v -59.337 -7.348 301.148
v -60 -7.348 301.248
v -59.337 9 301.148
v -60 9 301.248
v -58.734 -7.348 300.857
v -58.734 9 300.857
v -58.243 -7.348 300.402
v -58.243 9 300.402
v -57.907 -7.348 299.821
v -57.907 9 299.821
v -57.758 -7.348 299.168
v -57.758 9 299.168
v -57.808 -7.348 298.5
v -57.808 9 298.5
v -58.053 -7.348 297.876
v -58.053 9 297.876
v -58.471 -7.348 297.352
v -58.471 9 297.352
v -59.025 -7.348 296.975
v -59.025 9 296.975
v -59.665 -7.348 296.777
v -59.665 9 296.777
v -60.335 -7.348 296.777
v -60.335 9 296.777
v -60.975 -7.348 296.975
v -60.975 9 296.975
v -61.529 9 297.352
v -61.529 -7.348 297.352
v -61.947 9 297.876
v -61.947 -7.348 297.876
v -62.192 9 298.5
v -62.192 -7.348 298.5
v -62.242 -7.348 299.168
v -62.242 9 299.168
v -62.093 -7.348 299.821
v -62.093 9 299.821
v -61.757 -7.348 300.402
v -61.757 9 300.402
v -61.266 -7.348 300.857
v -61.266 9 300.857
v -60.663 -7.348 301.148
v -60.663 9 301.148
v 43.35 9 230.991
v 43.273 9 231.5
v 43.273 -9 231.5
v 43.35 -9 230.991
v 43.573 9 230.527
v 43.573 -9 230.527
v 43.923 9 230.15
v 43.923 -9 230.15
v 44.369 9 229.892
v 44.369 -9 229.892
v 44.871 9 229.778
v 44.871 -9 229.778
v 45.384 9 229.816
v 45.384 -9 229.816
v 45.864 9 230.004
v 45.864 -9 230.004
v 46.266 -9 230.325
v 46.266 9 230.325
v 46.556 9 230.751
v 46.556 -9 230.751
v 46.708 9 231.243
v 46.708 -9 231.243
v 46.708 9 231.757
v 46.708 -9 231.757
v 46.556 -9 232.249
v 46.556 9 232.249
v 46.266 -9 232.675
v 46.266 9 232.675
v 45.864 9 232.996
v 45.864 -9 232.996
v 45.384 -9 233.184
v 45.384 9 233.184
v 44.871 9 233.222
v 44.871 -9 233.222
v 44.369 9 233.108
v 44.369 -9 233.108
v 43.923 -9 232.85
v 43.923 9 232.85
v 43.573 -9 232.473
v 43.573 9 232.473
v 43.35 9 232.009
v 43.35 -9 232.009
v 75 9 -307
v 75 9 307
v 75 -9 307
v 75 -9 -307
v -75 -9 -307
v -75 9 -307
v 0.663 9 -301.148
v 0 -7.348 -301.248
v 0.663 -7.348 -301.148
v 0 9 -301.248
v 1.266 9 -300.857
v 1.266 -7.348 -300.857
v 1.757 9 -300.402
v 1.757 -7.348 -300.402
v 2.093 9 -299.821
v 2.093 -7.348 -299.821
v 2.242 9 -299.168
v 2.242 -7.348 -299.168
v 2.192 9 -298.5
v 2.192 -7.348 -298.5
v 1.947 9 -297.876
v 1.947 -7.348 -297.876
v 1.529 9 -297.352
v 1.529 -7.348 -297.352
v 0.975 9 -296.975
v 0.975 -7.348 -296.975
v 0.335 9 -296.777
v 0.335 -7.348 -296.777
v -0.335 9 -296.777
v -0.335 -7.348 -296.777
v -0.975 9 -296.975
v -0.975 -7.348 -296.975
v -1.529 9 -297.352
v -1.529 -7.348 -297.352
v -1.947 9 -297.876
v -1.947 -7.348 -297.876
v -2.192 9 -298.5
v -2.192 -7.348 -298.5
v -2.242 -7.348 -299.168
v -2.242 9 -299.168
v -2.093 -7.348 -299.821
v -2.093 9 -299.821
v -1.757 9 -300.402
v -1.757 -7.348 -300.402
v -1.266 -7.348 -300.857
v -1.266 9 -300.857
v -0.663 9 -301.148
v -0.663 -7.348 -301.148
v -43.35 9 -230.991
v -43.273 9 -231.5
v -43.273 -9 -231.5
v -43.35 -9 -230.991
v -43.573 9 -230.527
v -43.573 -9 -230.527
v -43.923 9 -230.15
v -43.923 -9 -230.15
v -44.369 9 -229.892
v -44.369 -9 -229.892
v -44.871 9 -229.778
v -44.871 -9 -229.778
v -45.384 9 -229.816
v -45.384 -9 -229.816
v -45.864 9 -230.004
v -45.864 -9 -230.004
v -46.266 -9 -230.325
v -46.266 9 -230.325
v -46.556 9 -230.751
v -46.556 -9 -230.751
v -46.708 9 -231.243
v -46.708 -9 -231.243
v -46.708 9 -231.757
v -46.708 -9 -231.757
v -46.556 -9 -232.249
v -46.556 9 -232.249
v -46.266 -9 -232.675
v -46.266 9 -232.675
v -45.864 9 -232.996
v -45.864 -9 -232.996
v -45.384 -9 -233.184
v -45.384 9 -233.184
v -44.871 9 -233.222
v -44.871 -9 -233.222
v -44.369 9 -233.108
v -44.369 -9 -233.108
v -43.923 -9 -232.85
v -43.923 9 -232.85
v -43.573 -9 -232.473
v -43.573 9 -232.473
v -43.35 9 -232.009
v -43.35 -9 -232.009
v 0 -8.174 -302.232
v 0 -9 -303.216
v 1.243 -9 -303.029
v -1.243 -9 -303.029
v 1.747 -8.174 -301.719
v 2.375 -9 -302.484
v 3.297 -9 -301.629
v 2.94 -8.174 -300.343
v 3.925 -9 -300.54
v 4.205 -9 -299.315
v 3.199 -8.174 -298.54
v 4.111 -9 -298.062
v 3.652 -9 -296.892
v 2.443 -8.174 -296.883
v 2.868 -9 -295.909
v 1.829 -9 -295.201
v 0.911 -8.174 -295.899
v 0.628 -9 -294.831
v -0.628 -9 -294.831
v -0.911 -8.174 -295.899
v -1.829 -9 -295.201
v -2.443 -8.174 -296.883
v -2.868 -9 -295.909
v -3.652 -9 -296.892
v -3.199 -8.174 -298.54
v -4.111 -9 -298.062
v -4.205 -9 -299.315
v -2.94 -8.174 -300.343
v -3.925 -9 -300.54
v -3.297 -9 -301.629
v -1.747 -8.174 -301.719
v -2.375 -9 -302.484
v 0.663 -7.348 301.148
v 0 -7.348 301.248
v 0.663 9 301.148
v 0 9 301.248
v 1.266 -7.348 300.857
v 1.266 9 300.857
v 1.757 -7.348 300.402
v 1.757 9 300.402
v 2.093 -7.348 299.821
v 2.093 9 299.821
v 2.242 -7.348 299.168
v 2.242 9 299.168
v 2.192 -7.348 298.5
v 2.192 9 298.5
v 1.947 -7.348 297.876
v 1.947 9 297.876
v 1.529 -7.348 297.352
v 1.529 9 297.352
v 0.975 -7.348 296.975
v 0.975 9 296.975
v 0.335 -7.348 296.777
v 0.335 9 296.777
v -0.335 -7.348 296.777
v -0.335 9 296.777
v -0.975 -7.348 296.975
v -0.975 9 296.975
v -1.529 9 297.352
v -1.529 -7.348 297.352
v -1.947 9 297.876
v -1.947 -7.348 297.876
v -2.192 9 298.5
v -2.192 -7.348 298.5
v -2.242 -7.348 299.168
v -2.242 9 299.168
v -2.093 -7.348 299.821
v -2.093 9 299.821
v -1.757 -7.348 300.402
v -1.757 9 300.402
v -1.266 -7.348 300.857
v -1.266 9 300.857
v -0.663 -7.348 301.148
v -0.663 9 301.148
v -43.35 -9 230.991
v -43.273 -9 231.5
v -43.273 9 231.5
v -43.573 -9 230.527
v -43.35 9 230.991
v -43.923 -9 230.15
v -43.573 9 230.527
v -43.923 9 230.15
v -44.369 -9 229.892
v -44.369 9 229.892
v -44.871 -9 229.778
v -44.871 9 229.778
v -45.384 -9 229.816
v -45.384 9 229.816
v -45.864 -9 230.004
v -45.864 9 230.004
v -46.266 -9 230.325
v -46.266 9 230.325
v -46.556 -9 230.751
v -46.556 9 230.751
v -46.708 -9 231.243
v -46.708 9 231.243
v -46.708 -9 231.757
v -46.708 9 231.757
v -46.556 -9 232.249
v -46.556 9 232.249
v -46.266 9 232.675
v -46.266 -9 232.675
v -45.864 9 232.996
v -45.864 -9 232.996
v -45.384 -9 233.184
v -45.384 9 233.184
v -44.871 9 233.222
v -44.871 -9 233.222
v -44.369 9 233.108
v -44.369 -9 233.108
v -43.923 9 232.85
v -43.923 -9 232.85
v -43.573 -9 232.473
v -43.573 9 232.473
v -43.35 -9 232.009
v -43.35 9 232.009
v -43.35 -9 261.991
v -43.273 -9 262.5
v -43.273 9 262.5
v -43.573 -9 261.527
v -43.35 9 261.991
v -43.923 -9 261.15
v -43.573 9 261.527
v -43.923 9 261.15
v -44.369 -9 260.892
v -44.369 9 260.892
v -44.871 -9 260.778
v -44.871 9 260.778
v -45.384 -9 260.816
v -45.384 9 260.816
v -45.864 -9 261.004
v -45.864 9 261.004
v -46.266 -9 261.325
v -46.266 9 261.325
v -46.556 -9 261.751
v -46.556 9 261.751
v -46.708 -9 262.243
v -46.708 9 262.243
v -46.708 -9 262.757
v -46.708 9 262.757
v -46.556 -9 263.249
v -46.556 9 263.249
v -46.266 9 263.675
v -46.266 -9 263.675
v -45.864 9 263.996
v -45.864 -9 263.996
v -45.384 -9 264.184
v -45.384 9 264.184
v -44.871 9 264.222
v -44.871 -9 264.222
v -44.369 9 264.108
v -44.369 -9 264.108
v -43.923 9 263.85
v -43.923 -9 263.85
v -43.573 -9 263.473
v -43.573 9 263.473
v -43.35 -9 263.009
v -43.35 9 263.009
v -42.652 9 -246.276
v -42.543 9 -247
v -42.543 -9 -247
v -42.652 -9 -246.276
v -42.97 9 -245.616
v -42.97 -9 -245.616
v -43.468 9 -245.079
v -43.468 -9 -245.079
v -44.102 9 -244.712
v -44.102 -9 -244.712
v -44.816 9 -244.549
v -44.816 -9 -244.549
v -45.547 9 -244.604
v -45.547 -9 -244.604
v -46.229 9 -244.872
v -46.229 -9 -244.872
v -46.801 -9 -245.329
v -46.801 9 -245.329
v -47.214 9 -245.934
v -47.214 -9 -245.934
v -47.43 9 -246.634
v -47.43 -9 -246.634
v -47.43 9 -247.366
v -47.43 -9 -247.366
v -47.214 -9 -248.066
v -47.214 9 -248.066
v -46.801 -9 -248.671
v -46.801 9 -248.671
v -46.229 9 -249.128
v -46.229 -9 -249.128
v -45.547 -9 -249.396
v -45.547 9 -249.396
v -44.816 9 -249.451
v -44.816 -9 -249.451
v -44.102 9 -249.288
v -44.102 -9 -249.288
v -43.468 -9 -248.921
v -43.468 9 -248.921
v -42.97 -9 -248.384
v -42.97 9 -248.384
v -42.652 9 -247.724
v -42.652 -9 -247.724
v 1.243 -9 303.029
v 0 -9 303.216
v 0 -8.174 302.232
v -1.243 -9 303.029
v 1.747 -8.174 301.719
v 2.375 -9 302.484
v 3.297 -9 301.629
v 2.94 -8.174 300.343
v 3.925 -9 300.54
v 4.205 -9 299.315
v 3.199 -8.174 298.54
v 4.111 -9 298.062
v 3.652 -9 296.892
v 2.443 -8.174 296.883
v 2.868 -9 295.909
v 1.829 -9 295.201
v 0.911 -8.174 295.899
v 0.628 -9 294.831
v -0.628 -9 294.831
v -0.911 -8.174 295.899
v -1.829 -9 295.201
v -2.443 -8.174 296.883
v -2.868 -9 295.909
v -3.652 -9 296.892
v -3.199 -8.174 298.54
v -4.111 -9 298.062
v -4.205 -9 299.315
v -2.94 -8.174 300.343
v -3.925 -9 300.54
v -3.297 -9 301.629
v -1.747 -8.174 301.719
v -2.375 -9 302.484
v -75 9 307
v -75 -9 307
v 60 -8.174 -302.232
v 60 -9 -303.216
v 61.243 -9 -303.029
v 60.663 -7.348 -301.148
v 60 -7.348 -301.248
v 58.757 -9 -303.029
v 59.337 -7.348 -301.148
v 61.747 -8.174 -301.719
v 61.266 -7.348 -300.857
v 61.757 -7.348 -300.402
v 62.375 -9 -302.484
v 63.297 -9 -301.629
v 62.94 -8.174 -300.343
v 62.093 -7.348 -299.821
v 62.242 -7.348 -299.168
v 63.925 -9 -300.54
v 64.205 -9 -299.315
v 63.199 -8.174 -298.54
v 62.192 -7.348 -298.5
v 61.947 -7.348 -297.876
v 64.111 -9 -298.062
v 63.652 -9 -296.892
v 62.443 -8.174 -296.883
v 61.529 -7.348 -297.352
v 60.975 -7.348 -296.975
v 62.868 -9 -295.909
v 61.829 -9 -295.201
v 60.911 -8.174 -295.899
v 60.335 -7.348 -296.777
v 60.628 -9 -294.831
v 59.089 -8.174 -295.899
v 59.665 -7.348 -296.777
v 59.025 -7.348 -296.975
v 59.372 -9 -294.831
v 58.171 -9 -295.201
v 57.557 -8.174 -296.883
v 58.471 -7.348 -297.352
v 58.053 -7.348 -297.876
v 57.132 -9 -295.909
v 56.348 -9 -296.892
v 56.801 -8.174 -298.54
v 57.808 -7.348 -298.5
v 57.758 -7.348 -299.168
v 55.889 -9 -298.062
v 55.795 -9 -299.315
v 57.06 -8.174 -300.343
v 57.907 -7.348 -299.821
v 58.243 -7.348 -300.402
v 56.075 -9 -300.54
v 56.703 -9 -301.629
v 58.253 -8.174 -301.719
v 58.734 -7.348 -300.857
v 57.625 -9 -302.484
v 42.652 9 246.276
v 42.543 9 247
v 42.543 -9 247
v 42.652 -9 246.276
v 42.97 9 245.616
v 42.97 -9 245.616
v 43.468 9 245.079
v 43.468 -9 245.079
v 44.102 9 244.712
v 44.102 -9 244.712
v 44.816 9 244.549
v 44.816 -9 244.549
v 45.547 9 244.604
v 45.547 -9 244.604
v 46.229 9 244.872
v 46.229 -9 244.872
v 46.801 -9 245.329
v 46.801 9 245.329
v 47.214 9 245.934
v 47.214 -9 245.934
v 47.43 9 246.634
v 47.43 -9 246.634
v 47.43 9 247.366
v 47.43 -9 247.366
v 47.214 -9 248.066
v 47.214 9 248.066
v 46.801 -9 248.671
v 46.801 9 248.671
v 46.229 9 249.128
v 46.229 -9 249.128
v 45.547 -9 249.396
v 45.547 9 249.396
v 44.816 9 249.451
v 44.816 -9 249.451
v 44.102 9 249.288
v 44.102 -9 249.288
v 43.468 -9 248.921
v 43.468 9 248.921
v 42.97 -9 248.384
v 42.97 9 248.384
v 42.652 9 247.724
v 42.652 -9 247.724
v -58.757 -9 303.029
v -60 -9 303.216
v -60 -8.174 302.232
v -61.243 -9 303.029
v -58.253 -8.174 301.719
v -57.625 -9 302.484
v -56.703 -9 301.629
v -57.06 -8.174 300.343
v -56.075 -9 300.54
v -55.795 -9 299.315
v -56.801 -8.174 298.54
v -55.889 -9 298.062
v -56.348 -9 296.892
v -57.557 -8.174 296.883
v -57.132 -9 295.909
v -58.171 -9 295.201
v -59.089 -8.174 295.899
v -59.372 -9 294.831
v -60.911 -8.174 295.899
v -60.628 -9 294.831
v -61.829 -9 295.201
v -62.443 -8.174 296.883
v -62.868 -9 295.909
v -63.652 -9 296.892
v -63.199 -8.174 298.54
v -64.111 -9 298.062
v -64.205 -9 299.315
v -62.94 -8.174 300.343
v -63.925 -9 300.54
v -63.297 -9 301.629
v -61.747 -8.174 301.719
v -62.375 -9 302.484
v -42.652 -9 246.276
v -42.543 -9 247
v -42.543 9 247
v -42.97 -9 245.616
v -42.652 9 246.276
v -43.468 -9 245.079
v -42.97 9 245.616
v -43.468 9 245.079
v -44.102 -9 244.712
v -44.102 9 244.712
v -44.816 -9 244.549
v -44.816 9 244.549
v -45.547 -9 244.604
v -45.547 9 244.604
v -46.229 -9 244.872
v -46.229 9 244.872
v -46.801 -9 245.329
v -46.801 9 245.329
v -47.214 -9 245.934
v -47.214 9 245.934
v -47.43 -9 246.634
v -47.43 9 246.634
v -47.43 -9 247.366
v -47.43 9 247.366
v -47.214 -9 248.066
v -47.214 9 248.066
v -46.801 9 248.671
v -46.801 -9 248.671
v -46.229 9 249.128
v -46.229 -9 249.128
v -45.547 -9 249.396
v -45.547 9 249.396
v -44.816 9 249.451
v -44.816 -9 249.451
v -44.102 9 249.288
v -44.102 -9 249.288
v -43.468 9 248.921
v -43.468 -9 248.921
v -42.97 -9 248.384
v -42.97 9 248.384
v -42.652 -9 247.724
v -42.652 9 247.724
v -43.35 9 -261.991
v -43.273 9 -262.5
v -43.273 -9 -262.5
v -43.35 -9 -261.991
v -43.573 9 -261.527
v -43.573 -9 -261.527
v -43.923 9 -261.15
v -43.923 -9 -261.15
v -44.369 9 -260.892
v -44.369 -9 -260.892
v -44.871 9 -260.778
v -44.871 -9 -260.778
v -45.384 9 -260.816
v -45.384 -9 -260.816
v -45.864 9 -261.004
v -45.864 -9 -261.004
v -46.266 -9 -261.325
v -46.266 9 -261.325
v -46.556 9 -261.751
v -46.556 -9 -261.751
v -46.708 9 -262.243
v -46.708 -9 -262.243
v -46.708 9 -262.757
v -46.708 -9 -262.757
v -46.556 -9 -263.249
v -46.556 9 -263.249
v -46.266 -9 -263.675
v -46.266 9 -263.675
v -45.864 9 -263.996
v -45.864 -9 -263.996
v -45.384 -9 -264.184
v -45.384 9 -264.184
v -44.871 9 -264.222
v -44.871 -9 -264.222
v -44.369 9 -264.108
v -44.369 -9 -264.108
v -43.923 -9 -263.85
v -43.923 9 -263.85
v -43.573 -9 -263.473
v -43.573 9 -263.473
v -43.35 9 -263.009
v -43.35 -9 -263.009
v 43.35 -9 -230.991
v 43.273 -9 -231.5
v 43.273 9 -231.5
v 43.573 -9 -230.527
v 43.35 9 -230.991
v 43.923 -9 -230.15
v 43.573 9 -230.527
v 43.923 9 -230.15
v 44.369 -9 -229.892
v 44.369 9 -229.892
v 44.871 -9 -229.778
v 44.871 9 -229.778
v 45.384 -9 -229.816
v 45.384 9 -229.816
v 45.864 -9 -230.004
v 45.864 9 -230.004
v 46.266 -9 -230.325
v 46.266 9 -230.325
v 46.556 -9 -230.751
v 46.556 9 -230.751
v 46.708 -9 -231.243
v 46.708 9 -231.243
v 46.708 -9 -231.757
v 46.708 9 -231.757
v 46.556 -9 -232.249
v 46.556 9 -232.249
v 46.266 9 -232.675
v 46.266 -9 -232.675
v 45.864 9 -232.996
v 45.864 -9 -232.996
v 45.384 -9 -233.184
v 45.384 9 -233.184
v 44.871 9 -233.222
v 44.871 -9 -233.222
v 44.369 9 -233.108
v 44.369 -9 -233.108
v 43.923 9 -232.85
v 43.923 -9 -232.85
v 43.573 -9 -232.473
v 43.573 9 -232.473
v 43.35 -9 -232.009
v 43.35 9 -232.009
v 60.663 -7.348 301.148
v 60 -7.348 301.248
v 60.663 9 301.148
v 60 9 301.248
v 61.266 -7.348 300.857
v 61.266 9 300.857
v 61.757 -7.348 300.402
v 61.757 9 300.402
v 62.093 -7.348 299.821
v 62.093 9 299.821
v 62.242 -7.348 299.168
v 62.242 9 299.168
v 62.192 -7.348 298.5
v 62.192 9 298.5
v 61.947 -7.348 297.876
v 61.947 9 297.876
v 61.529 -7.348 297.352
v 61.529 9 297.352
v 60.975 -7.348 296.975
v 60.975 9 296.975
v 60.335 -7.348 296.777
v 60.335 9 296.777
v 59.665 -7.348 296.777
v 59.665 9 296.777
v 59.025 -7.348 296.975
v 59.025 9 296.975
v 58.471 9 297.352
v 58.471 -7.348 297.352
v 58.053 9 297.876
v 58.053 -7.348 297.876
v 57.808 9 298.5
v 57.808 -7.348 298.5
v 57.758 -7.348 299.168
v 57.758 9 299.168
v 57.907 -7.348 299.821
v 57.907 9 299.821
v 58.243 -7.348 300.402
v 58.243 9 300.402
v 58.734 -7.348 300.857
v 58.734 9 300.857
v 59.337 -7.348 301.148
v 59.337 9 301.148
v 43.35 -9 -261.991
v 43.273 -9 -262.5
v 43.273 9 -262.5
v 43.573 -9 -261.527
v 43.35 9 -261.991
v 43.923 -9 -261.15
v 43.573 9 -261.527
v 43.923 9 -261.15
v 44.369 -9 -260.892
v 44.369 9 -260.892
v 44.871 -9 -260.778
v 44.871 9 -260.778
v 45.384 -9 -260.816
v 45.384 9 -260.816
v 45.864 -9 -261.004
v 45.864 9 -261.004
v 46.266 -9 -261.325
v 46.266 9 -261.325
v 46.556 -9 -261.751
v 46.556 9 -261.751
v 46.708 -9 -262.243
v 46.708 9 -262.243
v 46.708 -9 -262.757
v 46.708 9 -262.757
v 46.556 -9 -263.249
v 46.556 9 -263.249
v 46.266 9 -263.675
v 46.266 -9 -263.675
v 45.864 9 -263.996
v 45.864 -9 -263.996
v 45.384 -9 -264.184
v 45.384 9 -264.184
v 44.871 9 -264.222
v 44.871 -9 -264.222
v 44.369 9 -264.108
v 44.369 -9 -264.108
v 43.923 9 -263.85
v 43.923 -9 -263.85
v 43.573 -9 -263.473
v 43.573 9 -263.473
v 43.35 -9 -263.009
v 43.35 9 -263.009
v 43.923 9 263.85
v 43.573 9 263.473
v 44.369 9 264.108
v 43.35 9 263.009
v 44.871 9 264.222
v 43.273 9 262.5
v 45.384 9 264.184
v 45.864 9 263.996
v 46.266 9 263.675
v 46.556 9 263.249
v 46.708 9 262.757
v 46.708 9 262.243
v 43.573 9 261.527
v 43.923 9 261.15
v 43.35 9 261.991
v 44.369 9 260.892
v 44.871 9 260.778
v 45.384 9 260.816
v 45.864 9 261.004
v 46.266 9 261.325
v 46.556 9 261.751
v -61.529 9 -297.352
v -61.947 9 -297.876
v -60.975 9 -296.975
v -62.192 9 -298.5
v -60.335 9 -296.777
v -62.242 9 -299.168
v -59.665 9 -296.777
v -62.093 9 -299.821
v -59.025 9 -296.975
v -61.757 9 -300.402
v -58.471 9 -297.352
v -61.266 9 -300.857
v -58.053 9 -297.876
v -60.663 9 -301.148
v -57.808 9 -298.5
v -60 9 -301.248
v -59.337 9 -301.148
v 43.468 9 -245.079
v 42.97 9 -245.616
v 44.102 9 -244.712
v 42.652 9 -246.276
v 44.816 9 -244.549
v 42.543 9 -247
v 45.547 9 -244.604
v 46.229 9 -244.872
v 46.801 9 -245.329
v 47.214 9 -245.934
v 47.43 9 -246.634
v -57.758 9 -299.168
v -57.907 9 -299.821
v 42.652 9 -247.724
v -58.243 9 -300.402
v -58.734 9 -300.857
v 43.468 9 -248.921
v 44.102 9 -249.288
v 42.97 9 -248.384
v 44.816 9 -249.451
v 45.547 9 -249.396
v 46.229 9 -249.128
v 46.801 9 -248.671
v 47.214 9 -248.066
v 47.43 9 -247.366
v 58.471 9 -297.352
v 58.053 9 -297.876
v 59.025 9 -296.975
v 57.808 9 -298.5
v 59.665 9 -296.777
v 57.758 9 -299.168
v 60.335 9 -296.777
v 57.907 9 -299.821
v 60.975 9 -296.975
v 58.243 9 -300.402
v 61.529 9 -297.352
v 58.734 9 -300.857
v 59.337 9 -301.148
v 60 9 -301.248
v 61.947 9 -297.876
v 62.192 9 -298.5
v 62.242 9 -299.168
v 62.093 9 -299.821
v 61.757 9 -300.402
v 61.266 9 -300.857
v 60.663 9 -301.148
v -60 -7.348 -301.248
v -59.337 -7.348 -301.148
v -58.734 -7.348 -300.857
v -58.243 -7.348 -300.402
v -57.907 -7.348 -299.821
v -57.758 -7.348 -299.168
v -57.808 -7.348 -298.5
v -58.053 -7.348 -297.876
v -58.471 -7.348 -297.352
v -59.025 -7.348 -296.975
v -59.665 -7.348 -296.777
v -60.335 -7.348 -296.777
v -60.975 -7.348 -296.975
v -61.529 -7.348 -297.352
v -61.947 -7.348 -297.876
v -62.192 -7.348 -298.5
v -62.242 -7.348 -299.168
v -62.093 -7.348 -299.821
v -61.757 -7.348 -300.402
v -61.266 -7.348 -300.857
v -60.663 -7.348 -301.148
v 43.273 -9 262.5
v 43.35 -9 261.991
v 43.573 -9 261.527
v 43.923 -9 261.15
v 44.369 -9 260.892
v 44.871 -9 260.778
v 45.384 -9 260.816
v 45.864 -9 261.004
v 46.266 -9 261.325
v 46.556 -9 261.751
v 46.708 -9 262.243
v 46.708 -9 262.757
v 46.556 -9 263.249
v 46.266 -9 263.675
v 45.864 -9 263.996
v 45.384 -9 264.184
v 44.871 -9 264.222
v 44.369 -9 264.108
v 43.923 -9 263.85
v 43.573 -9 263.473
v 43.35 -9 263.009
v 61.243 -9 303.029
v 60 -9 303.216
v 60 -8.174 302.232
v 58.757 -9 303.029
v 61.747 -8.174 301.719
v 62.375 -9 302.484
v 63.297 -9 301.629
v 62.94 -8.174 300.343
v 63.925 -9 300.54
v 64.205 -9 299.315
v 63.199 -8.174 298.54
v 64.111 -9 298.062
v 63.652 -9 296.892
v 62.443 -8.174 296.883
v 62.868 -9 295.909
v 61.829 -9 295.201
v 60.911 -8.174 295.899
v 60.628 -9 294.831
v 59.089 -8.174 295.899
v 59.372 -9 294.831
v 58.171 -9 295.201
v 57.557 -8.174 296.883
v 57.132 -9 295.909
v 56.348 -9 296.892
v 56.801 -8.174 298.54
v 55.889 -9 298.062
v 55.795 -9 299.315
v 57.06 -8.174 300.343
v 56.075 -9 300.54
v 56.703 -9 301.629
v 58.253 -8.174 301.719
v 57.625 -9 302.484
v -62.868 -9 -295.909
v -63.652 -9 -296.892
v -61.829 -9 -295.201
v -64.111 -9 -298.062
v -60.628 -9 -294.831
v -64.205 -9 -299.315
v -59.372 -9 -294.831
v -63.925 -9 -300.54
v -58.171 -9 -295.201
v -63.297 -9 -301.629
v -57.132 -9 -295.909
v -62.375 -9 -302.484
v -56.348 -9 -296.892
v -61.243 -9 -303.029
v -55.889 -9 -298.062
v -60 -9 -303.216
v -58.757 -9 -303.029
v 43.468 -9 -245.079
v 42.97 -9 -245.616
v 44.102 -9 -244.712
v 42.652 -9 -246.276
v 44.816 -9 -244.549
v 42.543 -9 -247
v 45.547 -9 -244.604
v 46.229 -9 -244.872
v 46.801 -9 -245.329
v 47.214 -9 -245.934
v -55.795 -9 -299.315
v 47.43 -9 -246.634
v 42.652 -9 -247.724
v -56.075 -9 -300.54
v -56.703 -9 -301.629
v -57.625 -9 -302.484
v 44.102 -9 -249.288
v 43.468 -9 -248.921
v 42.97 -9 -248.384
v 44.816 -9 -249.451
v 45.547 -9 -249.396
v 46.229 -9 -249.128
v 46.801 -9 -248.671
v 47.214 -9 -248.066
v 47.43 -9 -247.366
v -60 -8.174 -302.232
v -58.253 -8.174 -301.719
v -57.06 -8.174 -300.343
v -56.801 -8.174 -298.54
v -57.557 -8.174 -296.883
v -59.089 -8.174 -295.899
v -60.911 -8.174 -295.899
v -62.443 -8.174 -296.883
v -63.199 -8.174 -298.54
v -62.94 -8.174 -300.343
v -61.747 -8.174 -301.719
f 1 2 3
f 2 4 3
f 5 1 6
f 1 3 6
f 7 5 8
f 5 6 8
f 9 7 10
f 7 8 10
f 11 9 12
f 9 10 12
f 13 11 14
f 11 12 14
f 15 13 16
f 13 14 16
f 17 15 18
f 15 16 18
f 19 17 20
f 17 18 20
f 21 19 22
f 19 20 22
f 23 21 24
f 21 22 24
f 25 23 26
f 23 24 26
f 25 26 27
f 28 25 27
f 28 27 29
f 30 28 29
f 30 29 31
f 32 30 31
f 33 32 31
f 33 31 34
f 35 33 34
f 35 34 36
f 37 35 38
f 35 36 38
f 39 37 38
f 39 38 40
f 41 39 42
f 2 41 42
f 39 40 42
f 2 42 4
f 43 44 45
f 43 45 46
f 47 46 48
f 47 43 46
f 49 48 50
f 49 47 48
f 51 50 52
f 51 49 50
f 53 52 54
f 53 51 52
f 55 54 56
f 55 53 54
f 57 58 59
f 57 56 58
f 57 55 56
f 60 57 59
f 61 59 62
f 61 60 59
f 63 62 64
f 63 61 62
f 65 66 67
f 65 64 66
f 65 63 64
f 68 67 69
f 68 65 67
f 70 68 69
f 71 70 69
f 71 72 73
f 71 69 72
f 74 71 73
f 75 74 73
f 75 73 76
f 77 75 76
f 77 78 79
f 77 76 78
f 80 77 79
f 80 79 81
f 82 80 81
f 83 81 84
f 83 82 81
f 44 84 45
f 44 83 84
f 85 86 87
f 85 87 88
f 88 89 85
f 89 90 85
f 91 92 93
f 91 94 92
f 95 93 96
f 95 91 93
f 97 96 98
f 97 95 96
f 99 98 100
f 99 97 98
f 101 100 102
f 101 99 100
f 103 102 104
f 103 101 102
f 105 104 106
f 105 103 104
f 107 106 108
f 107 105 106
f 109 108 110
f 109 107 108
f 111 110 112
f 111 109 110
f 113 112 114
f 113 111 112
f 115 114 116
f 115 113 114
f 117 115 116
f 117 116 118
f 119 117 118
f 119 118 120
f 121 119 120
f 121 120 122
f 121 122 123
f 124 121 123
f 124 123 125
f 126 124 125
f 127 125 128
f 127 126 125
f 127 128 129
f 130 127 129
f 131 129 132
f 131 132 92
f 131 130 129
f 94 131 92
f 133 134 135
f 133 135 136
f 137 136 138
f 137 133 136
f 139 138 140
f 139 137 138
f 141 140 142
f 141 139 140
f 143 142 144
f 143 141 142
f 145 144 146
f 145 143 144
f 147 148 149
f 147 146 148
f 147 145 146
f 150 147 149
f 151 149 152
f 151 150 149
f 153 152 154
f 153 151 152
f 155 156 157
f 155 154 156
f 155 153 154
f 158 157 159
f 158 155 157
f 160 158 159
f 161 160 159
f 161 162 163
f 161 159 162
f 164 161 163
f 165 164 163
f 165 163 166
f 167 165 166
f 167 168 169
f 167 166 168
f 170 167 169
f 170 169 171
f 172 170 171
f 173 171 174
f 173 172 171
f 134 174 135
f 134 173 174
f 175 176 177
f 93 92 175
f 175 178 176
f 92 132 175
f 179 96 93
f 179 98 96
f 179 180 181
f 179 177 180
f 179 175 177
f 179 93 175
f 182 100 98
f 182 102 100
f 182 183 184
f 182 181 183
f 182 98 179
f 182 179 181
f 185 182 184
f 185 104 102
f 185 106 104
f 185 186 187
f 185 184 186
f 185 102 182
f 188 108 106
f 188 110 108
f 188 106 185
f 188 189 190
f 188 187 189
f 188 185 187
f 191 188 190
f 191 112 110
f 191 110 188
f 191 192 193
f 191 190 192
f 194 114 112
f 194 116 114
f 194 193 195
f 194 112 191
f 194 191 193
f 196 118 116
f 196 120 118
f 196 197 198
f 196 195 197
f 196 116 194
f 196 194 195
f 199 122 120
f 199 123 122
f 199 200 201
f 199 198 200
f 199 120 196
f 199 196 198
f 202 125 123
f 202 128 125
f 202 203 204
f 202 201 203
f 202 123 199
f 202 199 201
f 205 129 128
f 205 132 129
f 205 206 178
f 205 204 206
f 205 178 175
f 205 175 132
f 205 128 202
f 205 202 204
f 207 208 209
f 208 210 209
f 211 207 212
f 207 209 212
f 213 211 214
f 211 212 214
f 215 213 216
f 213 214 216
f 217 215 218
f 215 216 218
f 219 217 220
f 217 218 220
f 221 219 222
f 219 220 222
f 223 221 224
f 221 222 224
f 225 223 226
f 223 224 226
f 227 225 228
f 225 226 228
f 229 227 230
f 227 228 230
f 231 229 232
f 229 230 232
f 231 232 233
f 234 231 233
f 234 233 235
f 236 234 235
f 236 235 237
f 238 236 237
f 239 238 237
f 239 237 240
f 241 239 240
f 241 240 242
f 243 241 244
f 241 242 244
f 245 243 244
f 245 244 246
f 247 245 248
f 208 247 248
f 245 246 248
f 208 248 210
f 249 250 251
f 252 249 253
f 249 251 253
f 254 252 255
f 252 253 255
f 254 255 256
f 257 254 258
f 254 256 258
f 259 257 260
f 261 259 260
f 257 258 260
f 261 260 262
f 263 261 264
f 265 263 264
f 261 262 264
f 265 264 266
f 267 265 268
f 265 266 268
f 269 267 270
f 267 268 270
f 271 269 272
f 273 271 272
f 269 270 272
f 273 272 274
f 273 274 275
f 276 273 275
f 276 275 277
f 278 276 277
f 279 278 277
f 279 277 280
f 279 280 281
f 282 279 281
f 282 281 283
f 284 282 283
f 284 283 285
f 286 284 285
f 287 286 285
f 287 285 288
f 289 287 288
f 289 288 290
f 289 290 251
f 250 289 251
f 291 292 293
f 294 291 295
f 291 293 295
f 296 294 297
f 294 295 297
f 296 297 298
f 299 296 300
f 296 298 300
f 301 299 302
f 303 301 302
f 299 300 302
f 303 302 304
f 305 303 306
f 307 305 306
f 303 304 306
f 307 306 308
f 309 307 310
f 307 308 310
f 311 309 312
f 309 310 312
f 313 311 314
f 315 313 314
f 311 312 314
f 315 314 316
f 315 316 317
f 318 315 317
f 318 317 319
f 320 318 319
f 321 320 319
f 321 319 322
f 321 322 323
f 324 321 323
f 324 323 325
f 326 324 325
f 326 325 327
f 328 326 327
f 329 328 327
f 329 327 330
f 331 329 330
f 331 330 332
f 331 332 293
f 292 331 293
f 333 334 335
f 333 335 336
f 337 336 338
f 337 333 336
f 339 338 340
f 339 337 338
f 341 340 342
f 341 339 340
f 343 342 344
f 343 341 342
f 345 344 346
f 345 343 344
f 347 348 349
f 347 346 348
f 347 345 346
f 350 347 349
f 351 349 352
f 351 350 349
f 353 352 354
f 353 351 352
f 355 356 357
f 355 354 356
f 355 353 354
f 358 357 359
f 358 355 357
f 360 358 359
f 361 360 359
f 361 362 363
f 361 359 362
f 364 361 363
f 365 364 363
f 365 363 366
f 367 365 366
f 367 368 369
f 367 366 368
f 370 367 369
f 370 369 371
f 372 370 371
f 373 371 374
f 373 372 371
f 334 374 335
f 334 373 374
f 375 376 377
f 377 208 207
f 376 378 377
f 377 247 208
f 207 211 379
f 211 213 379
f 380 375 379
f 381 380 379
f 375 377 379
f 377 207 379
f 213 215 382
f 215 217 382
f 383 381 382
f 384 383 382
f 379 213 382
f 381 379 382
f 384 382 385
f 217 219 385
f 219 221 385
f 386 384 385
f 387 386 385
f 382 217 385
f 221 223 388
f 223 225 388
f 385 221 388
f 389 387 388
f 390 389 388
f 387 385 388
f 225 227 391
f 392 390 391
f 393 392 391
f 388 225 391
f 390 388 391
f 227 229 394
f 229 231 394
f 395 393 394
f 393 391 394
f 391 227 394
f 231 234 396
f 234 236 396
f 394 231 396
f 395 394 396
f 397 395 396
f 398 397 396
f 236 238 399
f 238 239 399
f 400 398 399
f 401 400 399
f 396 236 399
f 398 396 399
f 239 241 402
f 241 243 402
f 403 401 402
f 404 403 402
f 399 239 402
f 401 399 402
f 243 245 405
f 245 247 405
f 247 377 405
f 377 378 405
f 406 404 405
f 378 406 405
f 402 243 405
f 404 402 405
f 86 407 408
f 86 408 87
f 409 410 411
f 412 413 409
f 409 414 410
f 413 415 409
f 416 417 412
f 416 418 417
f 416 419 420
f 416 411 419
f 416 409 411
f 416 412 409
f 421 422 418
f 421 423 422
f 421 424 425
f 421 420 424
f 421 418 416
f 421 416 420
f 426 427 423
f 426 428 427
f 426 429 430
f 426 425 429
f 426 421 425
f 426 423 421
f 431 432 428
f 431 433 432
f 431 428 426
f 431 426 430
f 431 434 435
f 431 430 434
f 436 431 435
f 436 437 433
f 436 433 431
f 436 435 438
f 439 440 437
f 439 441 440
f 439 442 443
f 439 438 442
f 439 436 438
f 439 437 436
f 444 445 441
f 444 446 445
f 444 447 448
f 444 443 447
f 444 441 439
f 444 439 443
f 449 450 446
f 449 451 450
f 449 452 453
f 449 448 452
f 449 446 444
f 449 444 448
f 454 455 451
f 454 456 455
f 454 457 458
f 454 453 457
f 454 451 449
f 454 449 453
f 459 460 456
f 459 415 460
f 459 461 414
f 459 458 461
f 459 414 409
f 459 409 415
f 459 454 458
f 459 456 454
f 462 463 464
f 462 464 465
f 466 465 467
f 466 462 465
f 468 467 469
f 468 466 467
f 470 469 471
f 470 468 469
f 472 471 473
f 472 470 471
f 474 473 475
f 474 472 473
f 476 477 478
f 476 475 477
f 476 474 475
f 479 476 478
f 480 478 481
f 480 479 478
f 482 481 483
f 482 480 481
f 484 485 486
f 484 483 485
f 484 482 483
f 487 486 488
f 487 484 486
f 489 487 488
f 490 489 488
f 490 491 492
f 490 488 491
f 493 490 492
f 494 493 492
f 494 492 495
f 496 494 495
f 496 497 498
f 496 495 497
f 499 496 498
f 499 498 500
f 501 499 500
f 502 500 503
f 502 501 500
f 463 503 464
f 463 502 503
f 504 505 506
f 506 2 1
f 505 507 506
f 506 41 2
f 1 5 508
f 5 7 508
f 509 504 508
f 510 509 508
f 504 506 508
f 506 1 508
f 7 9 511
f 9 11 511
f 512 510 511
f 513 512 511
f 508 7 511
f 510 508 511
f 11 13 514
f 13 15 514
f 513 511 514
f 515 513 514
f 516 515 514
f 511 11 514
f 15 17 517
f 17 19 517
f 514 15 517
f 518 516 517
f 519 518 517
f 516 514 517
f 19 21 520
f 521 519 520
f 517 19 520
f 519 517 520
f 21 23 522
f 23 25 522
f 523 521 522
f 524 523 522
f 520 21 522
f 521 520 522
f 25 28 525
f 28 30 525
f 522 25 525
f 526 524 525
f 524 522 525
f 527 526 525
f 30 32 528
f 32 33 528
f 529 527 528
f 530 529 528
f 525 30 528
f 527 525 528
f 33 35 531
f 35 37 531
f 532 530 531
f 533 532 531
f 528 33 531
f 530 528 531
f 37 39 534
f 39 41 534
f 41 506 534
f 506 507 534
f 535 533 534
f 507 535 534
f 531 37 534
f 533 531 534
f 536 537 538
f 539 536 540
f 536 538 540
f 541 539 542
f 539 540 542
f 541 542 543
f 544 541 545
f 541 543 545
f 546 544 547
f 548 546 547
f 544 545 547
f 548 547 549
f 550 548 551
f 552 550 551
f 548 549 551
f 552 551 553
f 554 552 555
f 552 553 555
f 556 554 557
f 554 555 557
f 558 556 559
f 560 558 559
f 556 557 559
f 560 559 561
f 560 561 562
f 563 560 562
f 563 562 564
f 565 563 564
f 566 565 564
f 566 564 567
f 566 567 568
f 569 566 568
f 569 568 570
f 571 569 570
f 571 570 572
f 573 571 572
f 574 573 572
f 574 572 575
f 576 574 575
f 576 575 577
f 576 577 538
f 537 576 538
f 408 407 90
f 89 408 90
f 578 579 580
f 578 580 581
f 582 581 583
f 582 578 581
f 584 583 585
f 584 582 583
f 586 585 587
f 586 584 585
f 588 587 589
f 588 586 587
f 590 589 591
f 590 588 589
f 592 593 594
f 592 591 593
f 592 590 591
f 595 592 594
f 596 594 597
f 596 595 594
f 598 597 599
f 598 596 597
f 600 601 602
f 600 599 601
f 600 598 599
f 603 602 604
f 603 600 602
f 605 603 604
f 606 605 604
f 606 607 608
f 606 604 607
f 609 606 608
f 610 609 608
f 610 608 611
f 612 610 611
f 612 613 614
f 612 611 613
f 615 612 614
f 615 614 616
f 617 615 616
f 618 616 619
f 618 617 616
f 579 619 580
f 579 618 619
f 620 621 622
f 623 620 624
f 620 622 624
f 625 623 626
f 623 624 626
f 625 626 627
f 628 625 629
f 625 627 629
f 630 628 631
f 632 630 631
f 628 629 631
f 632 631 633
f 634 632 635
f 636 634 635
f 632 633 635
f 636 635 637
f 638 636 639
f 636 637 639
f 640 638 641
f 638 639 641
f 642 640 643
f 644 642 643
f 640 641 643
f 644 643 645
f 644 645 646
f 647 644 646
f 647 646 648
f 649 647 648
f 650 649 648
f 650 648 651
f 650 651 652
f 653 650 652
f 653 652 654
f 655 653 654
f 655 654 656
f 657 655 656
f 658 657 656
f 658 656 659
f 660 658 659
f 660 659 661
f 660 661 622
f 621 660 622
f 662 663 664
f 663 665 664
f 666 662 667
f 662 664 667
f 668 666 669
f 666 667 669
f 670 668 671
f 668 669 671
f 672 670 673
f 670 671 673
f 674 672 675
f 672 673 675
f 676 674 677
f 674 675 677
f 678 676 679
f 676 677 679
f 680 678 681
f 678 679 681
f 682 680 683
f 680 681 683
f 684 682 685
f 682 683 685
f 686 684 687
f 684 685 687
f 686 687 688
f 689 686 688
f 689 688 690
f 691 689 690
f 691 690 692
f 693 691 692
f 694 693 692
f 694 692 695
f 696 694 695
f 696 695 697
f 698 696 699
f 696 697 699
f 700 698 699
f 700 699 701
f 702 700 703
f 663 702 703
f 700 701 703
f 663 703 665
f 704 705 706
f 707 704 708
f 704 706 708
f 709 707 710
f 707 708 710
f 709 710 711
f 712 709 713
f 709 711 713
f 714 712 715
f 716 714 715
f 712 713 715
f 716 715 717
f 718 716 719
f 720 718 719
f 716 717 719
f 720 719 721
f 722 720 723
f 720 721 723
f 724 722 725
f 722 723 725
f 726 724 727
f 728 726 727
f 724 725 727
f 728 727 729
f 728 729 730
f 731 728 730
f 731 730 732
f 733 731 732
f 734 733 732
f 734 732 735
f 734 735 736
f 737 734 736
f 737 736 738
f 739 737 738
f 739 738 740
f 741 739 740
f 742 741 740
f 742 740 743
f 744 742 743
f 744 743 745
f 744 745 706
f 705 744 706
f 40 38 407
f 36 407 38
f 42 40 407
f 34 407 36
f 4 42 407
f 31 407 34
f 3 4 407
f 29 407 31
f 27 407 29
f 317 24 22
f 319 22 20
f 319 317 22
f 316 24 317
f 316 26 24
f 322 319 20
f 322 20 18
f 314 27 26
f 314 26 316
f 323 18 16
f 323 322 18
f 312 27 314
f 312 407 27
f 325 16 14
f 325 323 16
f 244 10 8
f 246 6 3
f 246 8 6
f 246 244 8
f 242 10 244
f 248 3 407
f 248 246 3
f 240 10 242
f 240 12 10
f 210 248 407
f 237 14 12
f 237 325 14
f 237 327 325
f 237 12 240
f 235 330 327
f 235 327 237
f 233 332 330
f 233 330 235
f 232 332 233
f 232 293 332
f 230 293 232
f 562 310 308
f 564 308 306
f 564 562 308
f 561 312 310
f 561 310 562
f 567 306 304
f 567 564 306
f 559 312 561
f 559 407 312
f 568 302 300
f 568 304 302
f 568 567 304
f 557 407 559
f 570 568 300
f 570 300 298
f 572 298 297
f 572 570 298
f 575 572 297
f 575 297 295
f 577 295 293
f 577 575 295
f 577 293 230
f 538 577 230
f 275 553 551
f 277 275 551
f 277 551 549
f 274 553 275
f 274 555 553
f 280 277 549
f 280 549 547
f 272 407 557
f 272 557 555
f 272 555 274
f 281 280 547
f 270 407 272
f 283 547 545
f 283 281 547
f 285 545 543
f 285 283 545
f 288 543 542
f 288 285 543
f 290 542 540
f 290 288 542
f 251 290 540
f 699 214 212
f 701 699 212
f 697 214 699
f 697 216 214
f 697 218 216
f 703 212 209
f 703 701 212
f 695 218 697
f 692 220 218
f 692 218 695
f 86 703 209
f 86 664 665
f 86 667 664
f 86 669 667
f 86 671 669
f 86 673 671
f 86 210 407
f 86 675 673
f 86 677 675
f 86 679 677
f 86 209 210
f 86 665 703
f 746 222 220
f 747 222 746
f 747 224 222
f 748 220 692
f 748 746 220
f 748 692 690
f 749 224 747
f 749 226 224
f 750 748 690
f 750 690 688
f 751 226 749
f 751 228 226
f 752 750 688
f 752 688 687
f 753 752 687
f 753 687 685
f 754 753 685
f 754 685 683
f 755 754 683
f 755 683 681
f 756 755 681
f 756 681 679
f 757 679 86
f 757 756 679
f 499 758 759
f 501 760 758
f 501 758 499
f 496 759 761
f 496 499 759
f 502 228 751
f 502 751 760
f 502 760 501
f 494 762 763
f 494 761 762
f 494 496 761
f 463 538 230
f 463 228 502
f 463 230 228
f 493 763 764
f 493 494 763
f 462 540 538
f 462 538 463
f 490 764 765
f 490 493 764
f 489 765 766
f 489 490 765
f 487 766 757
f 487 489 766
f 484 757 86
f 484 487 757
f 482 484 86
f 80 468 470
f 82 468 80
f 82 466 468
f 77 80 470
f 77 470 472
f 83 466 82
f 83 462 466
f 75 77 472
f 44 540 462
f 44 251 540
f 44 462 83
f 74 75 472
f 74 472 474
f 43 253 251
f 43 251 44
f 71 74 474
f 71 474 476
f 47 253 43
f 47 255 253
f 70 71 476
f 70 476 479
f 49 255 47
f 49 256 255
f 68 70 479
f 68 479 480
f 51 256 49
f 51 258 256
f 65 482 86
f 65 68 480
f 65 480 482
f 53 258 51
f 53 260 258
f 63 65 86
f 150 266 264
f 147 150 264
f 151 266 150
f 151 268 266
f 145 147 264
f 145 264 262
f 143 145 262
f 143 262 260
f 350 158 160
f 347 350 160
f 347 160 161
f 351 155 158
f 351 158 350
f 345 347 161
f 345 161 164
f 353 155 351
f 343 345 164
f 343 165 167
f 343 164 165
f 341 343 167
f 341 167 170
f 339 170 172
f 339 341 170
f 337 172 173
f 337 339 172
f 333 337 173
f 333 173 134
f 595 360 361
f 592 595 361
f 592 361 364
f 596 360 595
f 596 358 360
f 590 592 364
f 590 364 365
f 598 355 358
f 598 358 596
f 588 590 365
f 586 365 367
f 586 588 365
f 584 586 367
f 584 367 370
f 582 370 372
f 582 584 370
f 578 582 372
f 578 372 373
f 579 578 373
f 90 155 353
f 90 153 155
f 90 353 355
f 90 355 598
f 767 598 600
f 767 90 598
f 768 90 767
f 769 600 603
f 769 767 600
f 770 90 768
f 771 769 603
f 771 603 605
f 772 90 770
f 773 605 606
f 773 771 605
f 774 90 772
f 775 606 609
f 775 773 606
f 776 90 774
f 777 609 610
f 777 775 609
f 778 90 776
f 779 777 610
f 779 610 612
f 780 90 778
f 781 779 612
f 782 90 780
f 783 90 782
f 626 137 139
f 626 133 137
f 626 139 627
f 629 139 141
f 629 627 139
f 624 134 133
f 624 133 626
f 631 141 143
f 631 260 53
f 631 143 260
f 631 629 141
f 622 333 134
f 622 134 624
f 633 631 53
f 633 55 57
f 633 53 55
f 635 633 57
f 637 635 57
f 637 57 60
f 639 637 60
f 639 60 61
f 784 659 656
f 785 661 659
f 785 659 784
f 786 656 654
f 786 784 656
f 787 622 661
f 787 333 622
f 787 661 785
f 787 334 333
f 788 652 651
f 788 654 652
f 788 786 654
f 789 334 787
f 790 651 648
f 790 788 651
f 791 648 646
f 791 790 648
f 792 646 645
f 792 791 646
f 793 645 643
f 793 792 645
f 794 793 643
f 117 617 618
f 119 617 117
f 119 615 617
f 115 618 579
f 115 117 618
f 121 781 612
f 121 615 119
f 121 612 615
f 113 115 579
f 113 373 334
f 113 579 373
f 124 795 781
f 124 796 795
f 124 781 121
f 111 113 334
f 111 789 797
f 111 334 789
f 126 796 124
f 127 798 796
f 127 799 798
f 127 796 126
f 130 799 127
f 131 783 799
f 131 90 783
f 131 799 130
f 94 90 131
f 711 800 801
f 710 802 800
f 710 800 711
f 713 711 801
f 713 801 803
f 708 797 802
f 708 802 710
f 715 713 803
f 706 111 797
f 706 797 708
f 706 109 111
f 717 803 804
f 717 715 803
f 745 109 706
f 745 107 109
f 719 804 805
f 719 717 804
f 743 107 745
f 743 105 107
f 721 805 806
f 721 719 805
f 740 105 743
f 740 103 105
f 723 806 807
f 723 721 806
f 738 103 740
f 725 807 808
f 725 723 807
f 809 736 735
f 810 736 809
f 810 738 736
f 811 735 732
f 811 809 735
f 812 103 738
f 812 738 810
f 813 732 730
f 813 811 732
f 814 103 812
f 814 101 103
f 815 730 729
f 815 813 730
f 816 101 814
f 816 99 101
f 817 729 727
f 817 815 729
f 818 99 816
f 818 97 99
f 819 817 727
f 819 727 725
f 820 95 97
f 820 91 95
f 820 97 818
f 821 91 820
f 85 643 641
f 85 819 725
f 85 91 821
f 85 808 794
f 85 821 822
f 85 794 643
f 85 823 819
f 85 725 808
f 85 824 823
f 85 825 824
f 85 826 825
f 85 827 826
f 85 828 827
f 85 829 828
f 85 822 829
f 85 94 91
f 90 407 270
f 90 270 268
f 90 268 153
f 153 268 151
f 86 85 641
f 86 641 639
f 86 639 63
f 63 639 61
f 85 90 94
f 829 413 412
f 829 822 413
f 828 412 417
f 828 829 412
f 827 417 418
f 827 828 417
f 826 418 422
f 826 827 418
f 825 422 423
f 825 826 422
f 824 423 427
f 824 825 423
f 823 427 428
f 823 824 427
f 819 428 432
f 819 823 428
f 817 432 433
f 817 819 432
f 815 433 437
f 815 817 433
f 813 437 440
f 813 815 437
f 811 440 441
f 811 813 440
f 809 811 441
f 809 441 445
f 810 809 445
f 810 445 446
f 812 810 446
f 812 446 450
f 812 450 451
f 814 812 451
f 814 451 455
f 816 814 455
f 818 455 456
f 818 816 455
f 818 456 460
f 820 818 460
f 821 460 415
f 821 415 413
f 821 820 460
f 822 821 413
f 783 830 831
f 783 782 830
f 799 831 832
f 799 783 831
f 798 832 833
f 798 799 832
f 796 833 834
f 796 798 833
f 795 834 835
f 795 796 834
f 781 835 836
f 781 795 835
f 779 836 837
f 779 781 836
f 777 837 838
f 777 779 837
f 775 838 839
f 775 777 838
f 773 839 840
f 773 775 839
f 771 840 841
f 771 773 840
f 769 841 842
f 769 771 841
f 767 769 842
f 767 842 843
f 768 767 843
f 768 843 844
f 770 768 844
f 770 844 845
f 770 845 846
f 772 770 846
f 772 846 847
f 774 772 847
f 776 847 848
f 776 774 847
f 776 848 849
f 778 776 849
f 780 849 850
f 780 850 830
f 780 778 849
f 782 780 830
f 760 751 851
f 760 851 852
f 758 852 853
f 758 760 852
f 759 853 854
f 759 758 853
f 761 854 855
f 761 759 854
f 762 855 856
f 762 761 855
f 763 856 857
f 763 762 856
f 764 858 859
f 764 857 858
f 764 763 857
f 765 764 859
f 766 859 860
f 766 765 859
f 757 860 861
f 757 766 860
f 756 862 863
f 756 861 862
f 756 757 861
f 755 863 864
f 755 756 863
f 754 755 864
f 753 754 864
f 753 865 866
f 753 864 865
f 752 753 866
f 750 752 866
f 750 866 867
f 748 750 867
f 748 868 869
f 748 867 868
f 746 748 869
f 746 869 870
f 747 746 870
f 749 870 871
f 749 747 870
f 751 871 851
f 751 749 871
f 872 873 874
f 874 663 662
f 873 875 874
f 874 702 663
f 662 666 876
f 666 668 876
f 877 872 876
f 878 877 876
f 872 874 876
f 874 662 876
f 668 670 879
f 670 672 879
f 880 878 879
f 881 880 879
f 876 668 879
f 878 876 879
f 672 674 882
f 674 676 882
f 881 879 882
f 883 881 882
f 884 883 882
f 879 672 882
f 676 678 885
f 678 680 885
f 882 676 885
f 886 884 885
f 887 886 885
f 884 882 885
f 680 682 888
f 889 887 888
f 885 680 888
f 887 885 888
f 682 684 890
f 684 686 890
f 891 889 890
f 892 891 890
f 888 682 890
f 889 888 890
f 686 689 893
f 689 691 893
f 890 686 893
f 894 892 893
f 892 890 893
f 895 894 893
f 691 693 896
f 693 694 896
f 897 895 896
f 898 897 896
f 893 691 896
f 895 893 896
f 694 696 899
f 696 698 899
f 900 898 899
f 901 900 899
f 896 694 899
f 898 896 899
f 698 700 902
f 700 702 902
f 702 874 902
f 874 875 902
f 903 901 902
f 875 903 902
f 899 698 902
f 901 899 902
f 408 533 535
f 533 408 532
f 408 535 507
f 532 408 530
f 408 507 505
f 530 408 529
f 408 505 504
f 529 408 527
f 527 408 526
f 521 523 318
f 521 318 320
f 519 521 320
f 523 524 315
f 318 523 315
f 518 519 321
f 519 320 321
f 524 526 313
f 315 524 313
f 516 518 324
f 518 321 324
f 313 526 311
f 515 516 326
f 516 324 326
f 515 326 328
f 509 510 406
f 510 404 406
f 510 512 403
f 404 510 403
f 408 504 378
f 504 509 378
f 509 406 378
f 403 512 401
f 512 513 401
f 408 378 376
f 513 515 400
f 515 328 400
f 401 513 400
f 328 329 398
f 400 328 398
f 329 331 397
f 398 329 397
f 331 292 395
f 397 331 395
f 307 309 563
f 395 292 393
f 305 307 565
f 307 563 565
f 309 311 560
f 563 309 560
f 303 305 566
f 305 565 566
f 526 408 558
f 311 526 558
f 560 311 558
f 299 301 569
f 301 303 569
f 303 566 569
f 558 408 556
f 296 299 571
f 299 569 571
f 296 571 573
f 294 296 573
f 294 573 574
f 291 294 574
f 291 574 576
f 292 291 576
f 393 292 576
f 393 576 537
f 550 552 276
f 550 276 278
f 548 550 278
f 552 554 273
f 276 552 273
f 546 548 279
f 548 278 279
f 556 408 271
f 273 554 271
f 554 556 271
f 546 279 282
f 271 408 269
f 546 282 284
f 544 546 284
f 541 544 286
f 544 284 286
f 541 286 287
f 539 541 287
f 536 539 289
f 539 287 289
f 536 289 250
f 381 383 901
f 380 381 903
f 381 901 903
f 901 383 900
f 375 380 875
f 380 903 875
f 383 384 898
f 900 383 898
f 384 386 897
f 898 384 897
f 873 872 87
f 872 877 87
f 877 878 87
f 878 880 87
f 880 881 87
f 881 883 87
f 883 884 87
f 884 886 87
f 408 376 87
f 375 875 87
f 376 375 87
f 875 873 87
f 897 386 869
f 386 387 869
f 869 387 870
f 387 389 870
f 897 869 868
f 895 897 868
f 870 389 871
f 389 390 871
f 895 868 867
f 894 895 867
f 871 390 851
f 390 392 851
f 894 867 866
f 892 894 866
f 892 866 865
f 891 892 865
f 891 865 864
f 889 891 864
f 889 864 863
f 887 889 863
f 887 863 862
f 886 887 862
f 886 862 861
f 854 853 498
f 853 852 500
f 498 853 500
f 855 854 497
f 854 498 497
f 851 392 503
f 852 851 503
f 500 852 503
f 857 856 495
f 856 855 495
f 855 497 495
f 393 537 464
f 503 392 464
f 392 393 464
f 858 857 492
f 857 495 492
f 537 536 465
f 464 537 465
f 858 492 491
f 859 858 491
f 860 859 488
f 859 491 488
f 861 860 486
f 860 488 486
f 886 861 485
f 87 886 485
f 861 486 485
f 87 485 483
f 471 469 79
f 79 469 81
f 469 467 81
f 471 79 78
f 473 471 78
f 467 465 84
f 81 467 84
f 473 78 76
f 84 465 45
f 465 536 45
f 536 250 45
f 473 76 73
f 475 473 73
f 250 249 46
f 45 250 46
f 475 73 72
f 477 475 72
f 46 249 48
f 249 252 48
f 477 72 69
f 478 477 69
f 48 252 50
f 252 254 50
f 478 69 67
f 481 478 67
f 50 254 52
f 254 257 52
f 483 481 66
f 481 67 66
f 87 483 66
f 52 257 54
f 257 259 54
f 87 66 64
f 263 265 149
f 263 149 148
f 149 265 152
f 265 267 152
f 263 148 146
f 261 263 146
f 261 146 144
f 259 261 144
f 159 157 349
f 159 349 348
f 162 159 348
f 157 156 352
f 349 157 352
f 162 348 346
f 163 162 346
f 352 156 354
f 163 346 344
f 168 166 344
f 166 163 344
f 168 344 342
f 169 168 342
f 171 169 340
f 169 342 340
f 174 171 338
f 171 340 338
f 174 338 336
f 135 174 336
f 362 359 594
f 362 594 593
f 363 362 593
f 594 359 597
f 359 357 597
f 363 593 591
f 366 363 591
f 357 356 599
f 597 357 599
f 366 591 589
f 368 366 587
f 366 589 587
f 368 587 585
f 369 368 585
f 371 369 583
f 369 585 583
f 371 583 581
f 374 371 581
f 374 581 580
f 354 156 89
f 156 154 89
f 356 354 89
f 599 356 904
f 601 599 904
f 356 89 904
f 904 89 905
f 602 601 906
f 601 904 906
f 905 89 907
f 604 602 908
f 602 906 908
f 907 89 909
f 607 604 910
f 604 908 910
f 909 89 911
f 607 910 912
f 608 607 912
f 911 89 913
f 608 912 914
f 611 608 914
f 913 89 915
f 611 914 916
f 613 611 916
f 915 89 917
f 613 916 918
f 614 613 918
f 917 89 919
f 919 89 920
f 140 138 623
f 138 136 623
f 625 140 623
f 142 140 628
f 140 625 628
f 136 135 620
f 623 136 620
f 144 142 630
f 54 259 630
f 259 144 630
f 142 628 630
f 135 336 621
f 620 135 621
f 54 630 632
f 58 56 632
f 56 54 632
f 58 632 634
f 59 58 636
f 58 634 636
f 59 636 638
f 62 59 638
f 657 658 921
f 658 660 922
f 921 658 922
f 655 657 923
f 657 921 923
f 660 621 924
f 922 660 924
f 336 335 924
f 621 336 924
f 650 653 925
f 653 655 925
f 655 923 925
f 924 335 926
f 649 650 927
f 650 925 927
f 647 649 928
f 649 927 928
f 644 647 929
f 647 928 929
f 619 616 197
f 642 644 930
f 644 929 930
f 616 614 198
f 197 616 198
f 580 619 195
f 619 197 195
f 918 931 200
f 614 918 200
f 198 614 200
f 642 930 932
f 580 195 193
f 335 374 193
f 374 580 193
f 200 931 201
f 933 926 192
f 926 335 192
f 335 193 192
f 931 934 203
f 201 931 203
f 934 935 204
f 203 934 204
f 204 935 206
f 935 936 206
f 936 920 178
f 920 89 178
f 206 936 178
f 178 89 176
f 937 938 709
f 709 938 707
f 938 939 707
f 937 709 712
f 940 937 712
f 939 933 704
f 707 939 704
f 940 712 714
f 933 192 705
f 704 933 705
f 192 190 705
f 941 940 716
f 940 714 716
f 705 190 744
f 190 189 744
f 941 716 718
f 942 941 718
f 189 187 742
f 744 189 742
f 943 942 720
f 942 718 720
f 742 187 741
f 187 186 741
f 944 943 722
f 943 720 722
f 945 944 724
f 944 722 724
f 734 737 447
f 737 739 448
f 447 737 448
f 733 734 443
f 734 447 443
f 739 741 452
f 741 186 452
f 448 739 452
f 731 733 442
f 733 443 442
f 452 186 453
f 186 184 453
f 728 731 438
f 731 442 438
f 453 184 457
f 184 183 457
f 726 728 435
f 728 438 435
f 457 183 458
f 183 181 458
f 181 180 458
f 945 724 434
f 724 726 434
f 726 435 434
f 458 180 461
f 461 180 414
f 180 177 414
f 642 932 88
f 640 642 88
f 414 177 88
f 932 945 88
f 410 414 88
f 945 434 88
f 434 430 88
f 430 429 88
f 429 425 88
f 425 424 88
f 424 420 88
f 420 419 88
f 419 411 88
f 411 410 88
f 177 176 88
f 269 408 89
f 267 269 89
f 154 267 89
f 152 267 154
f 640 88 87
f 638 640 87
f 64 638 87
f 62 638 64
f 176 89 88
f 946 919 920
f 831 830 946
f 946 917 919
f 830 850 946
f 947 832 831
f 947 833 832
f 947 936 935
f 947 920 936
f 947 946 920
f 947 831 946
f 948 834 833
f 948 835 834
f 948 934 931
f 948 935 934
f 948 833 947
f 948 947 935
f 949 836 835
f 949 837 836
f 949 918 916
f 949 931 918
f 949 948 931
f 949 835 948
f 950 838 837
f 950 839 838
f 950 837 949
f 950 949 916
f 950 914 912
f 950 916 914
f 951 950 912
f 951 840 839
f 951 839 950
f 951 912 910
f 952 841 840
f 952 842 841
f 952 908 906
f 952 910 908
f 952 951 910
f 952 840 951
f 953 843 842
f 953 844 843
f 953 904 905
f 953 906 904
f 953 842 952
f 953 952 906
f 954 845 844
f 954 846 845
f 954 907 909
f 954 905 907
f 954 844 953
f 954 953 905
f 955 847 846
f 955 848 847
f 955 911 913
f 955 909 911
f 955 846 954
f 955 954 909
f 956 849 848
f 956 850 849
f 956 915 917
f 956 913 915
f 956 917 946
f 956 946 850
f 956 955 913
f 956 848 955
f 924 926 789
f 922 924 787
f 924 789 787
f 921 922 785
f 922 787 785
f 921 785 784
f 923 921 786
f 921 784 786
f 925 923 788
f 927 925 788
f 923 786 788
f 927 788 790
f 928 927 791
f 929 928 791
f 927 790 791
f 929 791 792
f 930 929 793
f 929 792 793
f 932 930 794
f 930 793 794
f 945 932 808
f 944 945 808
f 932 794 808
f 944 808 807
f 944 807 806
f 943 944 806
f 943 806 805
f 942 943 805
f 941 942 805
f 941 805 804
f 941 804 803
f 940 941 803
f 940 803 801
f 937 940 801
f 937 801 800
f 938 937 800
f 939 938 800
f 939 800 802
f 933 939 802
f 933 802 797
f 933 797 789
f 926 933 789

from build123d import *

# Parameters (mm, degrees)
SKETCH1_W                                         = 150
SKETCH1_H                                         = 614
BOSS_EXTRUDE1_DEPTH                               = 9
CSK_FOR_8_FLAT_HEAD_MACHINE_SCREW_100_D           = 4.4958
CSK_FOR_8_FLAT_HEAD_MACHINE_SCREW_100_CSINK_D     = 8.4328
CSK_FOR_8_FLAT_HEAD_MACHINE_SCREW_100_CSINK_ANGLE = 100
F_8_36_TAPPED_HOLE1_D                             = 3.4544
F_8_CLEARANCE_HOLE1_D                             = 4.9149
MIRROR2_AT_THE_SECOND_PLANE_COPY_1_D              = 3.4544
MIRROR2_AT_THE_SECOND_PLANE_COPY_2_D              = 4.9149


with BuildPart() as part:
    # Sketch1 → Boss-Extrude1 (new, symmetric)
    with BuildSketch(Plane(origin=(0, 0, 0), x_dir=(1, 0, 0), z_dir=(0, 1, 0))):
        Rectangle(SKETCH1_W, SKETCH1_H)
    extrude(amount=BOSS_EXTRUDE1_DEPTH, both=True)

    # CSK for #8 Flat Head Machine Screw (100)1 (through all)
    with Locations(Plane(origin=(-75, -9, 0), x_dir=(0, 0, -1), z_dir=(0, -1, 0))):
        with Locations((-299, 135), (-299, 75), (-299, 15)):
            csk_for_8_flat_head_machine_screw_100 = CounterSinkHole(CSK_FOR_8_FLAT_HEAD_MACHINE_SCREW_100_D / 2, CSK_FOR_8_FLAT_HEAD_MACHINE_SCREW_100_CSINK_D / 2, counter_sink_angle=CSK_FOR_8_FLAT_HEAD_MACHINE_SCREW_100_CSINK_ANGLE)

    # Mirror1: CSK for #8 Flat Head Machine Screw (100)1 across plane
    add(csk_for_8_flat_head_machine_screw_100.mirror(Plane.XY), mode=Mode.SUBTRACT)

    # #8-36 Tapped Hole1 (through all)
    with Locations(Plane(origin=(0, -9, 0), x_dir=(-1, 0, 0), z_dir=(0, -1, 0))):
        with Locations((45, -262.5), (45, -231.5)):
            f_8_36_tapped_hole1 = Hole(F_8_36_TAPPED_HOLE1_D / 2)

    # #8 Clearance Hole1 (through all)
    with Locations(Plane(origin=(0, -9, 0), x_dir=(-1, 0, 0), z_dir=(0, -1, 0))):
        with Locations((45, -247)):
            f_8_clearance_hole1 = Hole(F_8_CLEARANCE_HOLE1_D / 2)

    # Mirror2: #8-36 Tapped Hole1, #8 Clearance Hole1 across plane
    add(f_8_36_tapped_hole1.mirror(Plane.XY), mode=Mode.SUBTRACT)
    add(f_8_clearance_hole1.mirror(Plane.XY), mode=Mode.SUBTRACT)

    # Mirror2 at the second plane: #8-36 Tapped Hole1, #8 Clearance Hole1 across plane
    add(f_8_36_tapped_hole1.mirror(Plane(origin=(0, 0, 0), x_dir=(0, 0, 1), z_dir=(1, 0, 0))), mode=Mode.SUBTRACT)
    add(f_8_clearance_hole1.mirror(Plane(origin=(0, 0, 0), x_dir=(0, 0, 1), z_dir=(1, 0, 0))), mode=Mode.SUBTRACT)

    # Mirror2 at the second plane copy 1 (through all)
    with Locations(Plane.XZ.offset(9)):
        with Locations((45, -262.5), (45, -231.5)):
            Hole(MIRROR2_AT_THE_SECOND_PLANE_COPY_1_D / 2)

    # Mirror2 at the second plane copy 2 (through all)
    with Locations(Plane.XZ.offset(9)):
        with Locations((45, -247)):
            Hole(MIRROR2_AT_THE_SECOND_PLANE_COPY_2_D / 2)


solid = part.part
